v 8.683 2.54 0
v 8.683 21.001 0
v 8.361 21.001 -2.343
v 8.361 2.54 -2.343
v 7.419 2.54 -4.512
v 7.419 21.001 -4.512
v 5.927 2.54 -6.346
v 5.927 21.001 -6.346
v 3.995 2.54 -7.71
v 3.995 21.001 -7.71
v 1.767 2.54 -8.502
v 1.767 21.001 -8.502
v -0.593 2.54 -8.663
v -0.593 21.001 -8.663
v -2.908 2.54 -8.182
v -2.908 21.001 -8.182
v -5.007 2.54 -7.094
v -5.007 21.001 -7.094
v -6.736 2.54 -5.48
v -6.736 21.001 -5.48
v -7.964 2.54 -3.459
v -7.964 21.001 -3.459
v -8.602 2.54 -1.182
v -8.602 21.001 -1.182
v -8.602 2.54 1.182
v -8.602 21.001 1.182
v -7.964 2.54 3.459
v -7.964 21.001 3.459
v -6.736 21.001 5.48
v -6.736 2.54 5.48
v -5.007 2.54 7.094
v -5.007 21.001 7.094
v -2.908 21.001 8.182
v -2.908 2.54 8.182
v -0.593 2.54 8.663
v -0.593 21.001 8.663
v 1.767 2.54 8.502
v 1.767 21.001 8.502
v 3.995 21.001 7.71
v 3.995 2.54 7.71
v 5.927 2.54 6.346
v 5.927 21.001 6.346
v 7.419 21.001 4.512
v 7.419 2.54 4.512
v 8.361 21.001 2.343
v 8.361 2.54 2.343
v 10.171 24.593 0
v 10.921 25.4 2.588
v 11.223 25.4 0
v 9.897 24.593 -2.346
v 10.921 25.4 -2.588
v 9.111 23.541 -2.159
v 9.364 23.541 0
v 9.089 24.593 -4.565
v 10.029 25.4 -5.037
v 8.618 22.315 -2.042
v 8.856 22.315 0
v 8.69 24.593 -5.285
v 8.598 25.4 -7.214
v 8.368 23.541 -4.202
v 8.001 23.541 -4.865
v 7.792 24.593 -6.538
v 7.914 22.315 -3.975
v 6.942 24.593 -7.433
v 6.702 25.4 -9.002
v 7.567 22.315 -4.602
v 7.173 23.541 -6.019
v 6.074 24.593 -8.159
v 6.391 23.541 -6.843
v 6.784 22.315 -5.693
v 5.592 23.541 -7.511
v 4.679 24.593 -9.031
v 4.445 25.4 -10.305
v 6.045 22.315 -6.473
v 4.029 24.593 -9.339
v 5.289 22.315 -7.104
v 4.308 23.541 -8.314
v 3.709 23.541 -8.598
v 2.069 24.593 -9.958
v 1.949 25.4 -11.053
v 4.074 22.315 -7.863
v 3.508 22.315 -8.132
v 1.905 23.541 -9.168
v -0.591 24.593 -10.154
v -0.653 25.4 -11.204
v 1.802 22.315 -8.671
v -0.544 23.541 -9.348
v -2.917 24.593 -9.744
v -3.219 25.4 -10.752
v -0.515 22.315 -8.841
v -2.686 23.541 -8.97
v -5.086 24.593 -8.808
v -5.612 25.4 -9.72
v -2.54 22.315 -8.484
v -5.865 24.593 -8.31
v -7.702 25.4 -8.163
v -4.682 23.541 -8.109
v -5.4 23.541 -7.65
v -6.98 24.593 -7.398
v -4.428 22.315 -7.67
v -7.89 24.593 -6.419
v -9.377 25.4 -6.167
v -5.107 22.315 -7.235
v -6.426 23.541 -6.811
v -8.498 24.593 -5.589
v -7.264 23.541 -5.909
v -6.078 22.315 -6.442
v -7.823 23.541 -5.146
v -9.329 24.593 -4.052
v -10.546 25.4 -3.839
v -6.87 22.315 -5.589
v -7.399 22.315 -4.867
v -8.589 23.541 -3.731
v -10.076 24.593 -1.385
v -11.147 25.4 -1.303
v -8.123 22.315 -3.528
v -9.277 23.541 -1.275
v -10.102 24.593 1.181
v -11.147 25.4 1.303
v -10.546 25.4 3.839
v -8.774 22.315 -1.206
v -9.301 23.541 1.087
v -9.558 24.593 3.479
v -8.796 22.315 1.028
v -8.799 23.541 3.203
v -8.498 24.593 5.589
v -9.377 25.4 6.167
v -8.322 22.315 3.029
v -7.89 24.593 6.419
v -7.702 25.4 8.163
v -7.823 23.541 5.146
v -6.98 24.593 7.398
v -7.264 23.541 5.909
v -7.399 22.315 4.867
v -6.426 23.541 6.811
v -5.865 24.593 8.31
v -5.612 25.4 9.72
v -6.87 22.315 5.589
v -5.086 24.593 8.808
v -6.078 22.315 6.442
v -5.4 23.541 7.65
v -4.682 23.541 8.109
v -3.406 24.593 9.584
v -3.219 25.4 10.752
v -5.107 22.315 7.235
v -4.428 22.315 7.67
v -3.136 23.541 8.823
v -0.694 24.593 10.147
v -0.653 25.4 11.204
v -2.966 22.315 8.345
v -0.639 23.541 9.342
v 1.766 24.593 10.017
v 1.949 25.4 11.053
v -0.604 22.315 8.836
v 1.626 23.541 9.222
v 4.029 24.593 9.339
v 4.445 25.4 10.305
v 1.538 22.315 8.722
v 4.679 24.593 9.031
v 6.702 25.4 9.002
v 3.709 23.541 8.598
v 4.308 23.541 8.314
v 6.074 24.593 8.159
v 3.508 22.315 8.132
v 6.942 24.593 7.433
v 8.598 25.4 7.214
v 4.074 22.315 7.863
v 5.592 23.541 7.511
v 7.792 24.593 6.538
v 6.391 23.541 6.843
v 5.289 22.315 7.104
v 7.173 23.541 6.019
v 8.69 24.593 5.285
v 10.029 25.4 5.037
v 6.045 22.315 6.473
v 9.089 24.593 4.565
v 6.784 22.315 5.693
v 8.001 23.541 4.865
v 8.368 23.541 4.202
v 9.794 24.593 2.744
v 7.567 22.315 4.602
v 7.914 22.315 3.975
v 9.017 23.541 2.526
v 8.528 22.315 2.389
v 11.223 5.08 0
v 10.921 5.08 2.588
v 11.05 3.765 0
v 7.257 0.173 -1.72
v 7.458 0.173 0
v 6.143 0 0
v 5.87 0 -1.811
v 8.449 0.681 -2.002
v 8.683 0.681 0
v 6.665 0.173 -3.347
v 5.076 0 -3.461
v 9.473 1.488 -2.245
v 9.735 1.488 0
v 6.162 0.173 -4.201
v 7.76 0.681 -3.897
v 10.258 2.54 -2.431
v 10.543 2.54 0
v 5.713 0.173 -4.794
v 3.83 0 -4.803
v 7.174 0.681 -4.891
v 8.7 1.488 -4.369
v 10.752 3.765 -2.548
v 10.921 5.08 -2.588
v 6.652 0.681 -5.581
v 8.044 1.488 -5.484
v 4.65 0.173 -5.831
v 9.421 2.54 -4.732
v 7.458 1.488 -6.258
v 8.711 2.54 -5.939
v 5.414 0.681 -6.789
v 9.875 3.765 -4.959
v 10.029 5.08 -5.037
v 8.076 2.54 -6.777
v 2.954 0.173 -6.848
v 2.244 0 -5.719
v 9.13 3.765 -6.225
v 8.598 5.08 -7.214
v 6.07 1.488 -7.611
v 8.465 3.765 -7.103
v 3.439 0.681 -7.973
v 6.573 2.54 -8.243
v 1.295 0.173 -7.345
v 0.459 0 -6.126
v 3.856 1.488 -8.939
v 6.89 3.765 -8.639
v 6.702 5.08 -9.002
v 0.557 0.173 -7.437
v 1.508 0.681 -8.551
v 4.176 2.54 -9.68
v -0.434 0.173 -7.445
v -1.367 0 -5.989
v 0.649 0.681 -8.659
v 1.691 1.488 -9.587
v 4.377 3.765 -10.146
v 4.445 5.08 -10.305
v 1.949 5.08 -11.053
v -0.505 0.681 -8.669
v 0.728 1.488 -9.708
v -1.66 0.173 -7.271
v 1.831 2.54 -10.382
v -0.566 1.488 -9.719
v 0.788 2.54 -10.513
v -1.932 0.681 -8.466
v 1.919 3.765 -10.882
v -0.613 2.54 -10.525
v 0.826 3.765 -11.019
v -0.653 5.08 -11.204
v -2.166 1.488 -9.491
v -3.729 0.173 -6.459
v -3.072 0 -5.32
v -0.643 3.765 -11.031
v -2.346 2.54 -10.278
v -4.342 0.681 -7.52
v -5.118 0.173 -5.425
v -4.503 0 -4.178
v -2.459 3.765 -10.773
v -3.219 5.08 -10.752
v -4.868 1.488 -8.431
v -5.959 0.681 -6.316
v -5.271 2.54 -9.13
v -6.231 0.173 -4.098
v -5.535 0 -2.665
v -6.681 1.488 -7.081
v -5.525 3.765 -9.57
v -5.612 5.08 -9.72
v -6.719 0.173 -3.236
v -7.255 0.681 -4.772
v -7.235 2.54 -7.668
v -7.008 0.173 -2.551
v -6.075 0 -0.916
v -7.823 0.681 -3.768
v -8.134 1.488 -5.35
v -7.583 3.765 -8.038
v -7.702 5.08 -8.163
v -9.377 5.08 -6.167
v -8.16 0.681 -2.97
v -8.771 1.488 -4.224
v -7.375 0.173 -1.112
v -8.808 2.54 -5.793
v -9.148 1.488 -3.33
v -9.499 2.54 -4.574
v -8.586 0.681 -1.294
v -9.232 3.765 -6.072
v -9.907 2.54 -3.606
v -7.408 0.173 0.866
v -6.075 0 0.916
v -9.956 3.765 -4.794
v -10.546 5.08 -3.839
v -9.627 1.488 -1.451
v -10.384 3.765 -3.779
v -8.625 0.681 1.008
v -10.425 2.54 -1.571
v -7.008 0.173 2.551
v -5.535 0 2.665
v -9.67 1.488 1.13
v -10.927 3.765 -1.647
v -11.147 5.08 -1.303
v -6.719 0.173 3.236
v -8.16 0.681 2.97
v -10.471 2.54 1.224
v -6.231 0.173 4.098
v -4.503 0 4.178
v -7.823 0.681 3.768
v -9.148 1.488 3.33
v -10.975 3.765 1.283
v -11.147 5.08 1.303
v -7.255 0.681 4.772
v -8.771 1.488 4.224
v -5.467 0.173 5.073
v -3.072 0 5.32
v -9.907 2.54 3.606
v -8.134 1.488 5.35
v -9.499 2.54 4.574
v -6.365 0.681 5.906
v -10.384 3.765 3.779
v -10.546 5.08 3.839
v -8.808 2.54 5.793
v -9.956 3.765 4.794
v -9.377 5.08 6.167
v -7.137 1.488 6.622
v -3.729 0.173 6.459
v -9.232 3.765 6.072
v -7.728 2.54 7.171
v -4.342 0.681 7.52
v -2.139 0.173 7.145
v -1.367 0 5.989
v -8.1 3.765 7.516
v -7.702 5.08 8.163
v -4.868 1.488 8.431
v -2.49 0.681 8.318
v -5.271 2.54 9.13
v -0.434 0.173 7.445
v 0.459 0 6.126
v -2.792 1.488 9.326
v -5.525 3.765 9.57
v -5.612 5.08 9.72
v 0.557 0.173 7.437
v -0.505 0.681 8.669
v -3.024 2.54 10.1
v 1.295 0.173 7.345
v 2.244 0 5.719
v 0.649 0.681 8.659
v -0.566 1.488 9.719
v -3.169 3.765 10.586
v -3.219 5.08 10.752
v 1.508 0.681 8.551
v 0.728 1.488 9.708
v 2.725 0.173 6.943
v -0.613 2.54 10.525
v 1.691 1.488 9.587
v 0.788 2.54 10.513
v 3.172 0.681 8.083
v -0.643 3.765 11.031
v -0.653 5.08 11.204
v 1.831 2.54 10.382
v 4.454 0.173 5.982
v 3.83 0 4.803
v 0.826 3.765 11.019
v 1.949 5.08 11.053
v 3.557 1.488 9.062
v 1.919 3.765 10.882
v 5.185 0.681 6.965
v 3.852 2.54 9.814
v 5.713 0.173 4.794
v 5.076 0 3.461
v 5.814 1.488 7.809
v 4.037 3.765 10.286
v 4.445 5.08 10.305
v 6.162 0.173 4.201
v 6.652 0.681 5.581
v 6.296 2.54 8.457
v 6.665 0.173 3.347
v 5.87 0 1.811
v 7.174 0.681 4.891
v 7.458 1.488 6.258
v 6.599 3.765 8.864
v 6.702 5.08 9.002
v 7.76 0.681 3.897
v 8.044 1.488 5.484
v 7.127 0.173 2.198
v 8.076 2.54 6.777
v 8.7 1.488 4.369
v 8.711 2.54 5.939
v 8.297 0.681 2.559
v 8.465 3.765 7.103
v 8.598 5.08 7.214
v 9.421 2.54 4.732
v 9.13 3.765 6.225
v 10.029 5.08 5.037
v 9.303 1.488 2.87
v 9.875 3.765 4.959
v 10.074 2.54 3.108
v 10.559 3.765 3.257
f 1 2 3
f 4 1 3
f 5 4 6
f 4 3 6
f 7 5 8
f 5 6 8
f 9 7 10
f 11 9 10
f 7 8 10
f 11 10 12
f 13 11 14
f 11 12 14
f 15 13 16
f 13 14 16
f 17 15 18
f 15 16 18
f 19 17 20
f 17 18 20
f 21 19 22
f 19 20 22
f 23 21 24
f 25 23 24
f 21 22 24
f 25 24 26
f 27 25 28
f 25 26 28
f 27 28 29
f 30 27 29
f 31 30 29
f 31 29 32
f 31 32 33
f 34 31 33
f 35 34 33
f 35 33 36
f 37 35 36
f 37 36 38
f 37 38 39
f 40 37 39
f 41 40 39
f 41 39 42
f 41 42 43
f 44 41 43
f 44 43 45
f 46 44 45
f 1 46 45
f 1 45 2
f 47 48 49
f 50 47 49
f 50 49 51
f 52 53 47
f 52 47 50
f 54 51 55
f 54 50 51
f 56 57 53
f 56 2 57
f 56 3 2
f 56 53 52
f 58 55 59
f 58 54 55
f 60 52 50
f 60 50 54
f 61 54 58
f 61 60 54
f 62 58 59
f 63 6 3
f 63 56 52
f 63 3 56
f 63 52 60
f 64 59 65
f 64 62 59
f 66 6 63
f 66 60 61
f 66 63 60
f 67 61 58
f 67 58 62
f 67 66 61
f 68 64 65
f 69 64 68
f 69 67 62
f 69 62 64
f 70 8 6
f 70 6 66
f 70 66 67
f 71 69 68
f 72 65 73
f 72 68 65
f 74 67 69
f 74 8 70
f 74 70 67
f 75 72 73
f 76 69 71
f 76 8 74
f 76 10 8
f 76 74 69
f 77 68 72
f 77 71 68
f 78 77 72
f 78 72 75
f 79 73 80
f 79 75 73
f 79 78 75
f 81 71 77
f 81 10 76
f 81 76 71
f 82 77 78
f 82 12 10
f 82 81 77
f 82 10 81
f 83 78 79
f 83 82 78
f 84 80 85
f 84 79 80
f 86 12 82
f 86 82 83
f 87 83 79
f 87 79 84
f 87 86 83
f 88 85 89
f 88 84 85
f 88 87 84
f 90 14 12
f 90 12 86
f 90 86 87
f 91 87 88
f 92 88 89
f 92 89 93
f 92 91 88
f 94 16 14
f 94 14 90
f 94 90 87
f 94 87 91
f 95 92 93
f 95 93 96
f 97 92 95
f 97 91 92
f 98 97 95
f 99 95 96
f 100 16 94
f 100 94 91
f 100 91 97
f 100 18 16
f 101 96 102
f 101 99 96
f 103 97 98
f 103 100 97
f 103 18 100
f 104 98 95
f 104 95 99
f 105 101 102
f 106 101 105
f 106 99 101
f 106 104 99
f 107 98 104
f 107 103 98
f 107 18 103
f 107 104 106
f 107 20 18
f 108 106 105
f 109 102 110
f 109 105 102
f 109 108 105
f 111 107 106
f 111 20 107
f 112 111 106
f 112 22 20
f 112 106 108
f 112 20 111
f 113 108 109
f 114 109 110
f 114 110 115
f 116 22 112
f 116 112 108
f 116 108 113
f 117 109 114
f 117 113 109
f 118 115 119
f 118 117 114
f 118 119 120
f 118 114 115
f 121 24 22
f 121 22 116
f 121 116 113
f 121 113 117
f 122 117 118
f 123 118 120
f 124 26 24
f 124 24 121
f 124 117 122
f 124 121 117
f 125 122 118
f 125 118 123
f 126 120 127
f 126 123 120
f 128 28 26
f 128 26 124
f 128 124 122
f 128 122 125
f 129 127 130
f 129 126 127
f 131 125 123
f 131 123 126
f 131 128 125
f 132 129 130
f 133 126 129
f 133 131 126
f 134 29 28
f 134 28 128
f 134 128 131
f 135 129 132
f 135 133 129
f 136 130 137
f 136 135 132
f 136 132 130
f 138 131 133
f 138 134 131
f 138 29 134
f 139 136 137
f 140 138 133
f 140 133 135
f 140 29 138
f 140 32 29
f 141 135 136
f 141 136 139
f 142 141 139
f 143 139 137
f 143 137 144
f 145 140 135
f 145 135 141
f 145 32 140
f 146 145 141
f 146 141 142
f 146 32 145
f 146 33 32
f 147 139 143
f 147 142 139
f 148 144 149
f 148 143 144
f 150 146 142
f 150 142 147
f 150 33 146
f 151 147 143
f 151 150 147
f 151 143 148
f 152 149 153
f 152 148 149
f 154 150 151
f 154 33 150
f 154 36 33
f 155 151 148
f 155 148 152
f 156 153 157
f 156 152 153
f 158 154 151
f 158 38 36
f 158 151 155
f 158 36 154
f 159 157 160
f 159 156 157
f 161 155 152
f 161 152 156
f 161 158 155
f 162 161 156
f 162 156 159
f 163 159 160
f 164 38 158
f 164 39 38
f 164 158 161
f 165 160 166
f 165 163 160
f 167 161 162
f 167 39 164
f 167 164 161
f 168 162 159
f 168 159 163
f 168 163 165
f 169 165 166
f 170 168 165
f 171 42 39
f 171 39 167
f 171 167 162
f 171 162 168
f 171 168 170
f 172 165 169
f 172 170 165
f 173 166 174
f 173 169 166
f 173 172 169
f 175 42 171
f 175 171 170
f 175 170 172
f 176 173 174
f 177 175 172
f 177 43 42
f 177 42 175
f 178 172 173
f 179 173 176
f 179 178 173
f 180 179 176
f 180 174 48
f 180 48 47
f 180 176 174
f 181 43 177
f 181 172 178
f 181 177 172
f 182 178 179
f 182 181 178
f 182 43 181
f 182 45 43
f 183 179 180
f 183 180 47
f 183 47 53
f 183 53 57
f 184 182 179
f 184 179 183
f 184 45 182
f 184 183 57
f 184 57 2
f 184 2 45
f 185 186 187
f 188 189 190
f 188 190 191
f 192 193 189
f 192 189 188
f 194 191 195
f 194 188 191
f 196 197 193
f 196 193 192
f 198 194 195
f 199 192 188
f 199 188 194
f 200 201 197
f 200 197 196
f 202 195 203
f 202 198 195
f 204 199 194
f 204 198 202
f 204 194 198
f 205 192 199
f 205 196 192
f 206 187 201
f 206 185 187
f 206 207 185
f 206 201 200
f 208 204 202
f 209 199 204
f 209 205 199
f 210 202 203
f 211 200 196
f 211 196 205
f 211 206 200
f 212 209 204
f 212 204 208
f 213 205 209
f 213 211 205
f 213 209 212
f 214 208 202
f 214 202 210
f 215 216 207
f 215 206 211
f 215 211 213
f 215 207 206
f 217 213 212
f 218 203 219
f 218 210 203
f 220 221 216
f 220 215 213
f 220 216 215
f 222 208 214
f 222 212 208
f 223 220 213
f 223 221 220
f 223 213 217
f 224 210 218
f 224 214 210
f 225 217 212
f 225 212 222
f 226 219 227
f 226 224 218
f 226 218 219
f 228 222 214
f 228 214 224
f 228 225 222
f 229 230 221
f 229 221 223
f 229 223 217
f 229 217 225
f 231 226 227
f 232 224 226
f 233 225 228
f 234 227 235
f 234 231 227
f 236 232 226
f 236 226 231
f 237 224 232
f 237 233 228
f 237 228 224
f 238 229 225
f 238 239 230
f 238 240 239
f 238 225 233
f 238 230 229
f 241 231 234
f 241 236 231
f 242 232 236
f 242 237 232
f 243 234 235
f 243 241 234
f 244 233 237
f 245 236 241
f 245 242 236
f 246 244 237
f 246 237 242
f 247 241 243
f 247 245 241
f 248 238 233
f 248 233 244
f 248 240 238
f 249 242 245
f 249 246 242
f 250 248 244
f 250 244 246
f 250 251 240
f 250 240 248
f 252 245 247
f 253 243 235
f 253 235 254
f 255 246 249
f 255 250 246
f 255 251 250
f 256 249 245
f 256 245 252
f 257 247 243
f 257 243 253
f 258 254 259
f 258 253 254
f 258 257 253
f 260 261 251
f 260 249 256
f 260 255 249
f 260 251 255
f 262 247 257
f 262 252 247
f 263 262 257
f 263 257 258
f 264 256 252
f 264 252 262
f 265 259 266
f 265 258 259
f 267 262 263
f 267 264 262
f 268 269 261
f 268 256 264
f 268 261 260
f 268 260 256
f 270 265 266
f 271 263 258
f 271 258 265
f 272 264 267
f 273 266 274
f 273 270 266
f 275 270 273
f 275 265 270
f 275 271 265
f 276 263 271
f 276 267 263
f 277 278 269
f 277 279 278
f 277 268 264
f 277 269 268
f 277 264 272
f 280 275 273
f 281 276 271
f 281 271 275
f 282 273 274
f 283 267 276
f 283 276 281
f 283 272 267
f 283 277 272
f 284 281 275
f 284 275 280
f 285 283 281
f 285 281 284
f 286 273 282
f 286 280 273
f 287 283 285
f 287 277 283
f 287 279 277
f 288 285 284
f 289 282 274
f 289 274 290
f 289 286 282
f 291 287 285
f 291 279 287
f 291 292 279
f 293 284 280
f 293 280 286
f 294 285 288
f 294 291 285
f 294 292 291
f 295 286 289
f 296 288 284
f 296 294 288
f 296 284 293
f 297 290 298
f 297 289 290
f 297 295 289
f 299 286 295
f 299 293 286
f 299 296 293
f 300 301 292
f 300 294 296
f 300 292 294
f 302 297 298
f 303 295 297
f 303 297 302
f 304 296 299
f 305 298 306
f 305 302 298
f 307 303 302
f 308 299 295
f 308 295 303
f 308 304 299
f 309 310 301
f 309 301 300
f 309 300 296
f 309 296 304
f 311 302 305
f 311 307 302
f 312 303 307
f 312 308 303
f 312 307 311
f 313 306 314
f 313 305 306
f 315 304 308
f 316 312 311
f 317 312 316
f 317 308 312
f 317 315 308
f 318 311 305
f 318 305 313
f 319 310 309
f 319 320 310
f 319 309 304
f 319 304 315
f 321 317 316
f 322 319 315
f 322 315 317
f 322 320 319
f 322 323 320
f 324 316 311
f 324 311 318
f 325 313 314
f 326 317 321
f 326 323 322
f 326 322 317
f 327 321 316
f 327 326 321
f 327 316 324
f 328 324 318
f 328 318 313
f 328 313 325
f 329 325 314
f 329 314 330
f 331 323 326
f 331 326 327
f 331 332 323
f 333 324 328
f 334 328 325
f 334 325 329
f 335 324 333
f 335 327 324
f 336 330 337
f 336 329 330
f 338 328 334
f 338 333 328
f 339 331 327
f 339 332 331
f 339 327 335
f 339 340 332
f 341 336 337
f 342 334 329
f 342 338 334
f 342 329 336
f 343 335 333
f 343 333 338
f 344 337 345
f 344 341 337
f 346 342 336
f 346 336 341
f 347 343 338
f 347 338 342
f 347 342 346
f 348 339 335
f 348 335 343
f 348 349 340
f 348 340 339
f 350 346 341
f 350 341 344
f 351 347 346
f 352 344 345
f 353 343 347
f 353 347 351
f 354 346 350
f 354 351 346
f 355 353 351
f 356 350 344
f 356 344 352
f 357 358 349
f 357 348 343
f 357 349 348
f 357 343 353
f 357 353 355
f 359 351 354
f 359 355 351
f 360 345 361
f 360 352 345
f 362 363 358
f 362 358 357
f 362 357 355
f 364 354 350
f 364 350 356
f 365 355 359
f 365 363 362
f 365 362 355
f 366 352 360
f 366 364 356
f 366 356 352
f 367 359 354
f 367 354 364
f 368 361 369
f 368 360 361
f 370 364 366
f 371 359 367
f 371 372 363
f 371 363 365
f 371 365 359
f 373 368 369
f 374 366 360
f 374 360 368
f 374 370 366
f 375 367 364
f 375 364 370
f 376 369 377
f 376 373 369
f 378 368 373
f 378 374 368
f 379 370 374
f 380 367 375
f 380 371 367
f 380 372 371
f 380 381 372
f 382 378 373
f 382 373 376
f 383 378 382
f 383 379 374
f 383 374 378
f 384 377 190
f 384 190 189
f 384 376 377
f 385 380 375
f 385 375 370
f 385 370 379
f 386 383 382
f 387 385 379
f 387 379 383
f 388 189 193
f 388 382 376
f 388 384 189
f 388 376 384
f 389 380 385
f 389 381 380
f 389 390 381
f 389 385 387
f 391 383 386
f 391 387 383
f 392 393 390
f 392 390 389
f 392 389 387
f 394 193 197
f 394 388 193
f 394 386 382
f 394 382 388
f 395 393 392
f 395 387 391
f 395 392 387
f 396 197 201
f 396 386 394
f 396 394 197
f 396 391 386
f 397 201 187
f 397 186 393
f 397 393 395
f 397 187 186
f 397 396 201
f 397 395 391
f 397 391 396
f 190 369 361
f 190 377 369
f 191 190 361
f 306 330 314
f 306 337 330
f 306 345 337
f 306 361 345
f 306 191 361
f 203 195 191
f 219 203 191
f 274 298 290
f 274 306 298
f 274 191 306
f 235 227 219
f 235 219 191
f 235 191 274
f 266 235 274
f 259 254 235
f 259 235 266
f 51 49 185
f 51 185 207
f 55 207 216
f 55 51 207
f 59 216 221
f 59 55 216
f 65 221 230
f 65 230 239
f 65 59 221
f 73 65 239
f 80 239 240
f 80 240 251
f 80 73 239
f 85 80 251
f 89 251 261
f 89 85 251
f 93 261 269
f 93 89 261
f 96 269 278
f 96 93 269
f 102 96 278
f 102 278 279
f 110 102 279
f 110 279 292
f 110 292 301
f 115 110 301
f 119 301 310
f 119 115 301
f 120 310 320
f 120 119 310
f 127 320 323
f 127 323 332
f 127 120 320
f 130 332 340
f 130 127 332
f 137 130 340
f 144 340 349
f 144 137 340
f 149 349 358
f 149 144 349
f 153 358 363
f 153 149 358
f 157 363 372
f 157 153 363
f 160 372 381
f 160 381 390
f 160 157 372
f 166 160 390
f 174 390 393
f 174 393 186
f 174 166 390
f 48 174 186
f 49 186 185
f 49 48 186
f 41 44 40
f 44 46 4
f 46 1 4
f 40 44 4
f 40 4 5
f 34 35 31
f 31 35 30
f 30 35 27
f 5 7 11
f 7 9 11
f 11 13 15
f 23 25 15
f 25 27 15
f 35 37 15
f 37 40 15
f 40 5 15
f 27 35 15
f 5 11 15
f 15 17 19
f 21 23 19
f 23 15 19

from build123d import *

# Parameters (mm, degrees)
F0_W = 11.223247965
F0_H = 25.4
F2_T = -2.54
F4_R = 5.08


# Not quite as in the source:
# - a fillet or chamfer that OpenCascade refuses, or shapes differently, is made with other operations: its cross-section is extruded or revolved along the edge and cut away or added


with BuildPart() as f1:
    # F0 (on Top) → F1 (revolve)
    with BuildSketch(Plane.XY):
        with Locations((5.6116239825, 12.7)):
            Rectangle(F0_W, F0_H)
    revolve(axis=Axis((0, 12.7, 0), (0, 1, 0)))

    # F2
    f2_openings = [f1.faces().sort_by_distance(p)[0] for p in [
        (0, 25.4, 0),
    ]]
    offset(amount=F2_T, openings=f2_openings)

    # F3: fillet of radius 5.08 on 1 edges, made by hand

    # F3_s1 → F3_t2 (revolve, cut)
    with BuildSketch(Plane.XY):
        with BuildLine():
            ThreePointArc((11.223247965, 25.4), (9.3638389137, 23.5405909488), (8.683247965, 21.0005909488))
            Line((8.683247965, 21.0005909488), (8.581647965, 21.0005909488))
            Line((8.581647965, 21.0005909488), (8.581647965, 25.4))
            Line((8.581647965, 25.4), (8.683247965, 25.5016))
            ThreePointArc((8.683247965, 25.5016), (9.953247965, 25.5016), (11.172447965, 25.487988181))
            Line((11.172447965, 25.487988181), (11.223247965, 25.4))
        make_face()
    revolve(axis=Axis((0, 25.4, 0), (0, 1, 0)), mode=Mode.SUBTRACT)

    # F4
    f4_edges = [f1.edges().sort_by_distance(p)[0] for p in [
        (-11.223248, 0, 0),
    ]]
    fillet(f4_edges, radius=F4_R)


solid = f1.part
